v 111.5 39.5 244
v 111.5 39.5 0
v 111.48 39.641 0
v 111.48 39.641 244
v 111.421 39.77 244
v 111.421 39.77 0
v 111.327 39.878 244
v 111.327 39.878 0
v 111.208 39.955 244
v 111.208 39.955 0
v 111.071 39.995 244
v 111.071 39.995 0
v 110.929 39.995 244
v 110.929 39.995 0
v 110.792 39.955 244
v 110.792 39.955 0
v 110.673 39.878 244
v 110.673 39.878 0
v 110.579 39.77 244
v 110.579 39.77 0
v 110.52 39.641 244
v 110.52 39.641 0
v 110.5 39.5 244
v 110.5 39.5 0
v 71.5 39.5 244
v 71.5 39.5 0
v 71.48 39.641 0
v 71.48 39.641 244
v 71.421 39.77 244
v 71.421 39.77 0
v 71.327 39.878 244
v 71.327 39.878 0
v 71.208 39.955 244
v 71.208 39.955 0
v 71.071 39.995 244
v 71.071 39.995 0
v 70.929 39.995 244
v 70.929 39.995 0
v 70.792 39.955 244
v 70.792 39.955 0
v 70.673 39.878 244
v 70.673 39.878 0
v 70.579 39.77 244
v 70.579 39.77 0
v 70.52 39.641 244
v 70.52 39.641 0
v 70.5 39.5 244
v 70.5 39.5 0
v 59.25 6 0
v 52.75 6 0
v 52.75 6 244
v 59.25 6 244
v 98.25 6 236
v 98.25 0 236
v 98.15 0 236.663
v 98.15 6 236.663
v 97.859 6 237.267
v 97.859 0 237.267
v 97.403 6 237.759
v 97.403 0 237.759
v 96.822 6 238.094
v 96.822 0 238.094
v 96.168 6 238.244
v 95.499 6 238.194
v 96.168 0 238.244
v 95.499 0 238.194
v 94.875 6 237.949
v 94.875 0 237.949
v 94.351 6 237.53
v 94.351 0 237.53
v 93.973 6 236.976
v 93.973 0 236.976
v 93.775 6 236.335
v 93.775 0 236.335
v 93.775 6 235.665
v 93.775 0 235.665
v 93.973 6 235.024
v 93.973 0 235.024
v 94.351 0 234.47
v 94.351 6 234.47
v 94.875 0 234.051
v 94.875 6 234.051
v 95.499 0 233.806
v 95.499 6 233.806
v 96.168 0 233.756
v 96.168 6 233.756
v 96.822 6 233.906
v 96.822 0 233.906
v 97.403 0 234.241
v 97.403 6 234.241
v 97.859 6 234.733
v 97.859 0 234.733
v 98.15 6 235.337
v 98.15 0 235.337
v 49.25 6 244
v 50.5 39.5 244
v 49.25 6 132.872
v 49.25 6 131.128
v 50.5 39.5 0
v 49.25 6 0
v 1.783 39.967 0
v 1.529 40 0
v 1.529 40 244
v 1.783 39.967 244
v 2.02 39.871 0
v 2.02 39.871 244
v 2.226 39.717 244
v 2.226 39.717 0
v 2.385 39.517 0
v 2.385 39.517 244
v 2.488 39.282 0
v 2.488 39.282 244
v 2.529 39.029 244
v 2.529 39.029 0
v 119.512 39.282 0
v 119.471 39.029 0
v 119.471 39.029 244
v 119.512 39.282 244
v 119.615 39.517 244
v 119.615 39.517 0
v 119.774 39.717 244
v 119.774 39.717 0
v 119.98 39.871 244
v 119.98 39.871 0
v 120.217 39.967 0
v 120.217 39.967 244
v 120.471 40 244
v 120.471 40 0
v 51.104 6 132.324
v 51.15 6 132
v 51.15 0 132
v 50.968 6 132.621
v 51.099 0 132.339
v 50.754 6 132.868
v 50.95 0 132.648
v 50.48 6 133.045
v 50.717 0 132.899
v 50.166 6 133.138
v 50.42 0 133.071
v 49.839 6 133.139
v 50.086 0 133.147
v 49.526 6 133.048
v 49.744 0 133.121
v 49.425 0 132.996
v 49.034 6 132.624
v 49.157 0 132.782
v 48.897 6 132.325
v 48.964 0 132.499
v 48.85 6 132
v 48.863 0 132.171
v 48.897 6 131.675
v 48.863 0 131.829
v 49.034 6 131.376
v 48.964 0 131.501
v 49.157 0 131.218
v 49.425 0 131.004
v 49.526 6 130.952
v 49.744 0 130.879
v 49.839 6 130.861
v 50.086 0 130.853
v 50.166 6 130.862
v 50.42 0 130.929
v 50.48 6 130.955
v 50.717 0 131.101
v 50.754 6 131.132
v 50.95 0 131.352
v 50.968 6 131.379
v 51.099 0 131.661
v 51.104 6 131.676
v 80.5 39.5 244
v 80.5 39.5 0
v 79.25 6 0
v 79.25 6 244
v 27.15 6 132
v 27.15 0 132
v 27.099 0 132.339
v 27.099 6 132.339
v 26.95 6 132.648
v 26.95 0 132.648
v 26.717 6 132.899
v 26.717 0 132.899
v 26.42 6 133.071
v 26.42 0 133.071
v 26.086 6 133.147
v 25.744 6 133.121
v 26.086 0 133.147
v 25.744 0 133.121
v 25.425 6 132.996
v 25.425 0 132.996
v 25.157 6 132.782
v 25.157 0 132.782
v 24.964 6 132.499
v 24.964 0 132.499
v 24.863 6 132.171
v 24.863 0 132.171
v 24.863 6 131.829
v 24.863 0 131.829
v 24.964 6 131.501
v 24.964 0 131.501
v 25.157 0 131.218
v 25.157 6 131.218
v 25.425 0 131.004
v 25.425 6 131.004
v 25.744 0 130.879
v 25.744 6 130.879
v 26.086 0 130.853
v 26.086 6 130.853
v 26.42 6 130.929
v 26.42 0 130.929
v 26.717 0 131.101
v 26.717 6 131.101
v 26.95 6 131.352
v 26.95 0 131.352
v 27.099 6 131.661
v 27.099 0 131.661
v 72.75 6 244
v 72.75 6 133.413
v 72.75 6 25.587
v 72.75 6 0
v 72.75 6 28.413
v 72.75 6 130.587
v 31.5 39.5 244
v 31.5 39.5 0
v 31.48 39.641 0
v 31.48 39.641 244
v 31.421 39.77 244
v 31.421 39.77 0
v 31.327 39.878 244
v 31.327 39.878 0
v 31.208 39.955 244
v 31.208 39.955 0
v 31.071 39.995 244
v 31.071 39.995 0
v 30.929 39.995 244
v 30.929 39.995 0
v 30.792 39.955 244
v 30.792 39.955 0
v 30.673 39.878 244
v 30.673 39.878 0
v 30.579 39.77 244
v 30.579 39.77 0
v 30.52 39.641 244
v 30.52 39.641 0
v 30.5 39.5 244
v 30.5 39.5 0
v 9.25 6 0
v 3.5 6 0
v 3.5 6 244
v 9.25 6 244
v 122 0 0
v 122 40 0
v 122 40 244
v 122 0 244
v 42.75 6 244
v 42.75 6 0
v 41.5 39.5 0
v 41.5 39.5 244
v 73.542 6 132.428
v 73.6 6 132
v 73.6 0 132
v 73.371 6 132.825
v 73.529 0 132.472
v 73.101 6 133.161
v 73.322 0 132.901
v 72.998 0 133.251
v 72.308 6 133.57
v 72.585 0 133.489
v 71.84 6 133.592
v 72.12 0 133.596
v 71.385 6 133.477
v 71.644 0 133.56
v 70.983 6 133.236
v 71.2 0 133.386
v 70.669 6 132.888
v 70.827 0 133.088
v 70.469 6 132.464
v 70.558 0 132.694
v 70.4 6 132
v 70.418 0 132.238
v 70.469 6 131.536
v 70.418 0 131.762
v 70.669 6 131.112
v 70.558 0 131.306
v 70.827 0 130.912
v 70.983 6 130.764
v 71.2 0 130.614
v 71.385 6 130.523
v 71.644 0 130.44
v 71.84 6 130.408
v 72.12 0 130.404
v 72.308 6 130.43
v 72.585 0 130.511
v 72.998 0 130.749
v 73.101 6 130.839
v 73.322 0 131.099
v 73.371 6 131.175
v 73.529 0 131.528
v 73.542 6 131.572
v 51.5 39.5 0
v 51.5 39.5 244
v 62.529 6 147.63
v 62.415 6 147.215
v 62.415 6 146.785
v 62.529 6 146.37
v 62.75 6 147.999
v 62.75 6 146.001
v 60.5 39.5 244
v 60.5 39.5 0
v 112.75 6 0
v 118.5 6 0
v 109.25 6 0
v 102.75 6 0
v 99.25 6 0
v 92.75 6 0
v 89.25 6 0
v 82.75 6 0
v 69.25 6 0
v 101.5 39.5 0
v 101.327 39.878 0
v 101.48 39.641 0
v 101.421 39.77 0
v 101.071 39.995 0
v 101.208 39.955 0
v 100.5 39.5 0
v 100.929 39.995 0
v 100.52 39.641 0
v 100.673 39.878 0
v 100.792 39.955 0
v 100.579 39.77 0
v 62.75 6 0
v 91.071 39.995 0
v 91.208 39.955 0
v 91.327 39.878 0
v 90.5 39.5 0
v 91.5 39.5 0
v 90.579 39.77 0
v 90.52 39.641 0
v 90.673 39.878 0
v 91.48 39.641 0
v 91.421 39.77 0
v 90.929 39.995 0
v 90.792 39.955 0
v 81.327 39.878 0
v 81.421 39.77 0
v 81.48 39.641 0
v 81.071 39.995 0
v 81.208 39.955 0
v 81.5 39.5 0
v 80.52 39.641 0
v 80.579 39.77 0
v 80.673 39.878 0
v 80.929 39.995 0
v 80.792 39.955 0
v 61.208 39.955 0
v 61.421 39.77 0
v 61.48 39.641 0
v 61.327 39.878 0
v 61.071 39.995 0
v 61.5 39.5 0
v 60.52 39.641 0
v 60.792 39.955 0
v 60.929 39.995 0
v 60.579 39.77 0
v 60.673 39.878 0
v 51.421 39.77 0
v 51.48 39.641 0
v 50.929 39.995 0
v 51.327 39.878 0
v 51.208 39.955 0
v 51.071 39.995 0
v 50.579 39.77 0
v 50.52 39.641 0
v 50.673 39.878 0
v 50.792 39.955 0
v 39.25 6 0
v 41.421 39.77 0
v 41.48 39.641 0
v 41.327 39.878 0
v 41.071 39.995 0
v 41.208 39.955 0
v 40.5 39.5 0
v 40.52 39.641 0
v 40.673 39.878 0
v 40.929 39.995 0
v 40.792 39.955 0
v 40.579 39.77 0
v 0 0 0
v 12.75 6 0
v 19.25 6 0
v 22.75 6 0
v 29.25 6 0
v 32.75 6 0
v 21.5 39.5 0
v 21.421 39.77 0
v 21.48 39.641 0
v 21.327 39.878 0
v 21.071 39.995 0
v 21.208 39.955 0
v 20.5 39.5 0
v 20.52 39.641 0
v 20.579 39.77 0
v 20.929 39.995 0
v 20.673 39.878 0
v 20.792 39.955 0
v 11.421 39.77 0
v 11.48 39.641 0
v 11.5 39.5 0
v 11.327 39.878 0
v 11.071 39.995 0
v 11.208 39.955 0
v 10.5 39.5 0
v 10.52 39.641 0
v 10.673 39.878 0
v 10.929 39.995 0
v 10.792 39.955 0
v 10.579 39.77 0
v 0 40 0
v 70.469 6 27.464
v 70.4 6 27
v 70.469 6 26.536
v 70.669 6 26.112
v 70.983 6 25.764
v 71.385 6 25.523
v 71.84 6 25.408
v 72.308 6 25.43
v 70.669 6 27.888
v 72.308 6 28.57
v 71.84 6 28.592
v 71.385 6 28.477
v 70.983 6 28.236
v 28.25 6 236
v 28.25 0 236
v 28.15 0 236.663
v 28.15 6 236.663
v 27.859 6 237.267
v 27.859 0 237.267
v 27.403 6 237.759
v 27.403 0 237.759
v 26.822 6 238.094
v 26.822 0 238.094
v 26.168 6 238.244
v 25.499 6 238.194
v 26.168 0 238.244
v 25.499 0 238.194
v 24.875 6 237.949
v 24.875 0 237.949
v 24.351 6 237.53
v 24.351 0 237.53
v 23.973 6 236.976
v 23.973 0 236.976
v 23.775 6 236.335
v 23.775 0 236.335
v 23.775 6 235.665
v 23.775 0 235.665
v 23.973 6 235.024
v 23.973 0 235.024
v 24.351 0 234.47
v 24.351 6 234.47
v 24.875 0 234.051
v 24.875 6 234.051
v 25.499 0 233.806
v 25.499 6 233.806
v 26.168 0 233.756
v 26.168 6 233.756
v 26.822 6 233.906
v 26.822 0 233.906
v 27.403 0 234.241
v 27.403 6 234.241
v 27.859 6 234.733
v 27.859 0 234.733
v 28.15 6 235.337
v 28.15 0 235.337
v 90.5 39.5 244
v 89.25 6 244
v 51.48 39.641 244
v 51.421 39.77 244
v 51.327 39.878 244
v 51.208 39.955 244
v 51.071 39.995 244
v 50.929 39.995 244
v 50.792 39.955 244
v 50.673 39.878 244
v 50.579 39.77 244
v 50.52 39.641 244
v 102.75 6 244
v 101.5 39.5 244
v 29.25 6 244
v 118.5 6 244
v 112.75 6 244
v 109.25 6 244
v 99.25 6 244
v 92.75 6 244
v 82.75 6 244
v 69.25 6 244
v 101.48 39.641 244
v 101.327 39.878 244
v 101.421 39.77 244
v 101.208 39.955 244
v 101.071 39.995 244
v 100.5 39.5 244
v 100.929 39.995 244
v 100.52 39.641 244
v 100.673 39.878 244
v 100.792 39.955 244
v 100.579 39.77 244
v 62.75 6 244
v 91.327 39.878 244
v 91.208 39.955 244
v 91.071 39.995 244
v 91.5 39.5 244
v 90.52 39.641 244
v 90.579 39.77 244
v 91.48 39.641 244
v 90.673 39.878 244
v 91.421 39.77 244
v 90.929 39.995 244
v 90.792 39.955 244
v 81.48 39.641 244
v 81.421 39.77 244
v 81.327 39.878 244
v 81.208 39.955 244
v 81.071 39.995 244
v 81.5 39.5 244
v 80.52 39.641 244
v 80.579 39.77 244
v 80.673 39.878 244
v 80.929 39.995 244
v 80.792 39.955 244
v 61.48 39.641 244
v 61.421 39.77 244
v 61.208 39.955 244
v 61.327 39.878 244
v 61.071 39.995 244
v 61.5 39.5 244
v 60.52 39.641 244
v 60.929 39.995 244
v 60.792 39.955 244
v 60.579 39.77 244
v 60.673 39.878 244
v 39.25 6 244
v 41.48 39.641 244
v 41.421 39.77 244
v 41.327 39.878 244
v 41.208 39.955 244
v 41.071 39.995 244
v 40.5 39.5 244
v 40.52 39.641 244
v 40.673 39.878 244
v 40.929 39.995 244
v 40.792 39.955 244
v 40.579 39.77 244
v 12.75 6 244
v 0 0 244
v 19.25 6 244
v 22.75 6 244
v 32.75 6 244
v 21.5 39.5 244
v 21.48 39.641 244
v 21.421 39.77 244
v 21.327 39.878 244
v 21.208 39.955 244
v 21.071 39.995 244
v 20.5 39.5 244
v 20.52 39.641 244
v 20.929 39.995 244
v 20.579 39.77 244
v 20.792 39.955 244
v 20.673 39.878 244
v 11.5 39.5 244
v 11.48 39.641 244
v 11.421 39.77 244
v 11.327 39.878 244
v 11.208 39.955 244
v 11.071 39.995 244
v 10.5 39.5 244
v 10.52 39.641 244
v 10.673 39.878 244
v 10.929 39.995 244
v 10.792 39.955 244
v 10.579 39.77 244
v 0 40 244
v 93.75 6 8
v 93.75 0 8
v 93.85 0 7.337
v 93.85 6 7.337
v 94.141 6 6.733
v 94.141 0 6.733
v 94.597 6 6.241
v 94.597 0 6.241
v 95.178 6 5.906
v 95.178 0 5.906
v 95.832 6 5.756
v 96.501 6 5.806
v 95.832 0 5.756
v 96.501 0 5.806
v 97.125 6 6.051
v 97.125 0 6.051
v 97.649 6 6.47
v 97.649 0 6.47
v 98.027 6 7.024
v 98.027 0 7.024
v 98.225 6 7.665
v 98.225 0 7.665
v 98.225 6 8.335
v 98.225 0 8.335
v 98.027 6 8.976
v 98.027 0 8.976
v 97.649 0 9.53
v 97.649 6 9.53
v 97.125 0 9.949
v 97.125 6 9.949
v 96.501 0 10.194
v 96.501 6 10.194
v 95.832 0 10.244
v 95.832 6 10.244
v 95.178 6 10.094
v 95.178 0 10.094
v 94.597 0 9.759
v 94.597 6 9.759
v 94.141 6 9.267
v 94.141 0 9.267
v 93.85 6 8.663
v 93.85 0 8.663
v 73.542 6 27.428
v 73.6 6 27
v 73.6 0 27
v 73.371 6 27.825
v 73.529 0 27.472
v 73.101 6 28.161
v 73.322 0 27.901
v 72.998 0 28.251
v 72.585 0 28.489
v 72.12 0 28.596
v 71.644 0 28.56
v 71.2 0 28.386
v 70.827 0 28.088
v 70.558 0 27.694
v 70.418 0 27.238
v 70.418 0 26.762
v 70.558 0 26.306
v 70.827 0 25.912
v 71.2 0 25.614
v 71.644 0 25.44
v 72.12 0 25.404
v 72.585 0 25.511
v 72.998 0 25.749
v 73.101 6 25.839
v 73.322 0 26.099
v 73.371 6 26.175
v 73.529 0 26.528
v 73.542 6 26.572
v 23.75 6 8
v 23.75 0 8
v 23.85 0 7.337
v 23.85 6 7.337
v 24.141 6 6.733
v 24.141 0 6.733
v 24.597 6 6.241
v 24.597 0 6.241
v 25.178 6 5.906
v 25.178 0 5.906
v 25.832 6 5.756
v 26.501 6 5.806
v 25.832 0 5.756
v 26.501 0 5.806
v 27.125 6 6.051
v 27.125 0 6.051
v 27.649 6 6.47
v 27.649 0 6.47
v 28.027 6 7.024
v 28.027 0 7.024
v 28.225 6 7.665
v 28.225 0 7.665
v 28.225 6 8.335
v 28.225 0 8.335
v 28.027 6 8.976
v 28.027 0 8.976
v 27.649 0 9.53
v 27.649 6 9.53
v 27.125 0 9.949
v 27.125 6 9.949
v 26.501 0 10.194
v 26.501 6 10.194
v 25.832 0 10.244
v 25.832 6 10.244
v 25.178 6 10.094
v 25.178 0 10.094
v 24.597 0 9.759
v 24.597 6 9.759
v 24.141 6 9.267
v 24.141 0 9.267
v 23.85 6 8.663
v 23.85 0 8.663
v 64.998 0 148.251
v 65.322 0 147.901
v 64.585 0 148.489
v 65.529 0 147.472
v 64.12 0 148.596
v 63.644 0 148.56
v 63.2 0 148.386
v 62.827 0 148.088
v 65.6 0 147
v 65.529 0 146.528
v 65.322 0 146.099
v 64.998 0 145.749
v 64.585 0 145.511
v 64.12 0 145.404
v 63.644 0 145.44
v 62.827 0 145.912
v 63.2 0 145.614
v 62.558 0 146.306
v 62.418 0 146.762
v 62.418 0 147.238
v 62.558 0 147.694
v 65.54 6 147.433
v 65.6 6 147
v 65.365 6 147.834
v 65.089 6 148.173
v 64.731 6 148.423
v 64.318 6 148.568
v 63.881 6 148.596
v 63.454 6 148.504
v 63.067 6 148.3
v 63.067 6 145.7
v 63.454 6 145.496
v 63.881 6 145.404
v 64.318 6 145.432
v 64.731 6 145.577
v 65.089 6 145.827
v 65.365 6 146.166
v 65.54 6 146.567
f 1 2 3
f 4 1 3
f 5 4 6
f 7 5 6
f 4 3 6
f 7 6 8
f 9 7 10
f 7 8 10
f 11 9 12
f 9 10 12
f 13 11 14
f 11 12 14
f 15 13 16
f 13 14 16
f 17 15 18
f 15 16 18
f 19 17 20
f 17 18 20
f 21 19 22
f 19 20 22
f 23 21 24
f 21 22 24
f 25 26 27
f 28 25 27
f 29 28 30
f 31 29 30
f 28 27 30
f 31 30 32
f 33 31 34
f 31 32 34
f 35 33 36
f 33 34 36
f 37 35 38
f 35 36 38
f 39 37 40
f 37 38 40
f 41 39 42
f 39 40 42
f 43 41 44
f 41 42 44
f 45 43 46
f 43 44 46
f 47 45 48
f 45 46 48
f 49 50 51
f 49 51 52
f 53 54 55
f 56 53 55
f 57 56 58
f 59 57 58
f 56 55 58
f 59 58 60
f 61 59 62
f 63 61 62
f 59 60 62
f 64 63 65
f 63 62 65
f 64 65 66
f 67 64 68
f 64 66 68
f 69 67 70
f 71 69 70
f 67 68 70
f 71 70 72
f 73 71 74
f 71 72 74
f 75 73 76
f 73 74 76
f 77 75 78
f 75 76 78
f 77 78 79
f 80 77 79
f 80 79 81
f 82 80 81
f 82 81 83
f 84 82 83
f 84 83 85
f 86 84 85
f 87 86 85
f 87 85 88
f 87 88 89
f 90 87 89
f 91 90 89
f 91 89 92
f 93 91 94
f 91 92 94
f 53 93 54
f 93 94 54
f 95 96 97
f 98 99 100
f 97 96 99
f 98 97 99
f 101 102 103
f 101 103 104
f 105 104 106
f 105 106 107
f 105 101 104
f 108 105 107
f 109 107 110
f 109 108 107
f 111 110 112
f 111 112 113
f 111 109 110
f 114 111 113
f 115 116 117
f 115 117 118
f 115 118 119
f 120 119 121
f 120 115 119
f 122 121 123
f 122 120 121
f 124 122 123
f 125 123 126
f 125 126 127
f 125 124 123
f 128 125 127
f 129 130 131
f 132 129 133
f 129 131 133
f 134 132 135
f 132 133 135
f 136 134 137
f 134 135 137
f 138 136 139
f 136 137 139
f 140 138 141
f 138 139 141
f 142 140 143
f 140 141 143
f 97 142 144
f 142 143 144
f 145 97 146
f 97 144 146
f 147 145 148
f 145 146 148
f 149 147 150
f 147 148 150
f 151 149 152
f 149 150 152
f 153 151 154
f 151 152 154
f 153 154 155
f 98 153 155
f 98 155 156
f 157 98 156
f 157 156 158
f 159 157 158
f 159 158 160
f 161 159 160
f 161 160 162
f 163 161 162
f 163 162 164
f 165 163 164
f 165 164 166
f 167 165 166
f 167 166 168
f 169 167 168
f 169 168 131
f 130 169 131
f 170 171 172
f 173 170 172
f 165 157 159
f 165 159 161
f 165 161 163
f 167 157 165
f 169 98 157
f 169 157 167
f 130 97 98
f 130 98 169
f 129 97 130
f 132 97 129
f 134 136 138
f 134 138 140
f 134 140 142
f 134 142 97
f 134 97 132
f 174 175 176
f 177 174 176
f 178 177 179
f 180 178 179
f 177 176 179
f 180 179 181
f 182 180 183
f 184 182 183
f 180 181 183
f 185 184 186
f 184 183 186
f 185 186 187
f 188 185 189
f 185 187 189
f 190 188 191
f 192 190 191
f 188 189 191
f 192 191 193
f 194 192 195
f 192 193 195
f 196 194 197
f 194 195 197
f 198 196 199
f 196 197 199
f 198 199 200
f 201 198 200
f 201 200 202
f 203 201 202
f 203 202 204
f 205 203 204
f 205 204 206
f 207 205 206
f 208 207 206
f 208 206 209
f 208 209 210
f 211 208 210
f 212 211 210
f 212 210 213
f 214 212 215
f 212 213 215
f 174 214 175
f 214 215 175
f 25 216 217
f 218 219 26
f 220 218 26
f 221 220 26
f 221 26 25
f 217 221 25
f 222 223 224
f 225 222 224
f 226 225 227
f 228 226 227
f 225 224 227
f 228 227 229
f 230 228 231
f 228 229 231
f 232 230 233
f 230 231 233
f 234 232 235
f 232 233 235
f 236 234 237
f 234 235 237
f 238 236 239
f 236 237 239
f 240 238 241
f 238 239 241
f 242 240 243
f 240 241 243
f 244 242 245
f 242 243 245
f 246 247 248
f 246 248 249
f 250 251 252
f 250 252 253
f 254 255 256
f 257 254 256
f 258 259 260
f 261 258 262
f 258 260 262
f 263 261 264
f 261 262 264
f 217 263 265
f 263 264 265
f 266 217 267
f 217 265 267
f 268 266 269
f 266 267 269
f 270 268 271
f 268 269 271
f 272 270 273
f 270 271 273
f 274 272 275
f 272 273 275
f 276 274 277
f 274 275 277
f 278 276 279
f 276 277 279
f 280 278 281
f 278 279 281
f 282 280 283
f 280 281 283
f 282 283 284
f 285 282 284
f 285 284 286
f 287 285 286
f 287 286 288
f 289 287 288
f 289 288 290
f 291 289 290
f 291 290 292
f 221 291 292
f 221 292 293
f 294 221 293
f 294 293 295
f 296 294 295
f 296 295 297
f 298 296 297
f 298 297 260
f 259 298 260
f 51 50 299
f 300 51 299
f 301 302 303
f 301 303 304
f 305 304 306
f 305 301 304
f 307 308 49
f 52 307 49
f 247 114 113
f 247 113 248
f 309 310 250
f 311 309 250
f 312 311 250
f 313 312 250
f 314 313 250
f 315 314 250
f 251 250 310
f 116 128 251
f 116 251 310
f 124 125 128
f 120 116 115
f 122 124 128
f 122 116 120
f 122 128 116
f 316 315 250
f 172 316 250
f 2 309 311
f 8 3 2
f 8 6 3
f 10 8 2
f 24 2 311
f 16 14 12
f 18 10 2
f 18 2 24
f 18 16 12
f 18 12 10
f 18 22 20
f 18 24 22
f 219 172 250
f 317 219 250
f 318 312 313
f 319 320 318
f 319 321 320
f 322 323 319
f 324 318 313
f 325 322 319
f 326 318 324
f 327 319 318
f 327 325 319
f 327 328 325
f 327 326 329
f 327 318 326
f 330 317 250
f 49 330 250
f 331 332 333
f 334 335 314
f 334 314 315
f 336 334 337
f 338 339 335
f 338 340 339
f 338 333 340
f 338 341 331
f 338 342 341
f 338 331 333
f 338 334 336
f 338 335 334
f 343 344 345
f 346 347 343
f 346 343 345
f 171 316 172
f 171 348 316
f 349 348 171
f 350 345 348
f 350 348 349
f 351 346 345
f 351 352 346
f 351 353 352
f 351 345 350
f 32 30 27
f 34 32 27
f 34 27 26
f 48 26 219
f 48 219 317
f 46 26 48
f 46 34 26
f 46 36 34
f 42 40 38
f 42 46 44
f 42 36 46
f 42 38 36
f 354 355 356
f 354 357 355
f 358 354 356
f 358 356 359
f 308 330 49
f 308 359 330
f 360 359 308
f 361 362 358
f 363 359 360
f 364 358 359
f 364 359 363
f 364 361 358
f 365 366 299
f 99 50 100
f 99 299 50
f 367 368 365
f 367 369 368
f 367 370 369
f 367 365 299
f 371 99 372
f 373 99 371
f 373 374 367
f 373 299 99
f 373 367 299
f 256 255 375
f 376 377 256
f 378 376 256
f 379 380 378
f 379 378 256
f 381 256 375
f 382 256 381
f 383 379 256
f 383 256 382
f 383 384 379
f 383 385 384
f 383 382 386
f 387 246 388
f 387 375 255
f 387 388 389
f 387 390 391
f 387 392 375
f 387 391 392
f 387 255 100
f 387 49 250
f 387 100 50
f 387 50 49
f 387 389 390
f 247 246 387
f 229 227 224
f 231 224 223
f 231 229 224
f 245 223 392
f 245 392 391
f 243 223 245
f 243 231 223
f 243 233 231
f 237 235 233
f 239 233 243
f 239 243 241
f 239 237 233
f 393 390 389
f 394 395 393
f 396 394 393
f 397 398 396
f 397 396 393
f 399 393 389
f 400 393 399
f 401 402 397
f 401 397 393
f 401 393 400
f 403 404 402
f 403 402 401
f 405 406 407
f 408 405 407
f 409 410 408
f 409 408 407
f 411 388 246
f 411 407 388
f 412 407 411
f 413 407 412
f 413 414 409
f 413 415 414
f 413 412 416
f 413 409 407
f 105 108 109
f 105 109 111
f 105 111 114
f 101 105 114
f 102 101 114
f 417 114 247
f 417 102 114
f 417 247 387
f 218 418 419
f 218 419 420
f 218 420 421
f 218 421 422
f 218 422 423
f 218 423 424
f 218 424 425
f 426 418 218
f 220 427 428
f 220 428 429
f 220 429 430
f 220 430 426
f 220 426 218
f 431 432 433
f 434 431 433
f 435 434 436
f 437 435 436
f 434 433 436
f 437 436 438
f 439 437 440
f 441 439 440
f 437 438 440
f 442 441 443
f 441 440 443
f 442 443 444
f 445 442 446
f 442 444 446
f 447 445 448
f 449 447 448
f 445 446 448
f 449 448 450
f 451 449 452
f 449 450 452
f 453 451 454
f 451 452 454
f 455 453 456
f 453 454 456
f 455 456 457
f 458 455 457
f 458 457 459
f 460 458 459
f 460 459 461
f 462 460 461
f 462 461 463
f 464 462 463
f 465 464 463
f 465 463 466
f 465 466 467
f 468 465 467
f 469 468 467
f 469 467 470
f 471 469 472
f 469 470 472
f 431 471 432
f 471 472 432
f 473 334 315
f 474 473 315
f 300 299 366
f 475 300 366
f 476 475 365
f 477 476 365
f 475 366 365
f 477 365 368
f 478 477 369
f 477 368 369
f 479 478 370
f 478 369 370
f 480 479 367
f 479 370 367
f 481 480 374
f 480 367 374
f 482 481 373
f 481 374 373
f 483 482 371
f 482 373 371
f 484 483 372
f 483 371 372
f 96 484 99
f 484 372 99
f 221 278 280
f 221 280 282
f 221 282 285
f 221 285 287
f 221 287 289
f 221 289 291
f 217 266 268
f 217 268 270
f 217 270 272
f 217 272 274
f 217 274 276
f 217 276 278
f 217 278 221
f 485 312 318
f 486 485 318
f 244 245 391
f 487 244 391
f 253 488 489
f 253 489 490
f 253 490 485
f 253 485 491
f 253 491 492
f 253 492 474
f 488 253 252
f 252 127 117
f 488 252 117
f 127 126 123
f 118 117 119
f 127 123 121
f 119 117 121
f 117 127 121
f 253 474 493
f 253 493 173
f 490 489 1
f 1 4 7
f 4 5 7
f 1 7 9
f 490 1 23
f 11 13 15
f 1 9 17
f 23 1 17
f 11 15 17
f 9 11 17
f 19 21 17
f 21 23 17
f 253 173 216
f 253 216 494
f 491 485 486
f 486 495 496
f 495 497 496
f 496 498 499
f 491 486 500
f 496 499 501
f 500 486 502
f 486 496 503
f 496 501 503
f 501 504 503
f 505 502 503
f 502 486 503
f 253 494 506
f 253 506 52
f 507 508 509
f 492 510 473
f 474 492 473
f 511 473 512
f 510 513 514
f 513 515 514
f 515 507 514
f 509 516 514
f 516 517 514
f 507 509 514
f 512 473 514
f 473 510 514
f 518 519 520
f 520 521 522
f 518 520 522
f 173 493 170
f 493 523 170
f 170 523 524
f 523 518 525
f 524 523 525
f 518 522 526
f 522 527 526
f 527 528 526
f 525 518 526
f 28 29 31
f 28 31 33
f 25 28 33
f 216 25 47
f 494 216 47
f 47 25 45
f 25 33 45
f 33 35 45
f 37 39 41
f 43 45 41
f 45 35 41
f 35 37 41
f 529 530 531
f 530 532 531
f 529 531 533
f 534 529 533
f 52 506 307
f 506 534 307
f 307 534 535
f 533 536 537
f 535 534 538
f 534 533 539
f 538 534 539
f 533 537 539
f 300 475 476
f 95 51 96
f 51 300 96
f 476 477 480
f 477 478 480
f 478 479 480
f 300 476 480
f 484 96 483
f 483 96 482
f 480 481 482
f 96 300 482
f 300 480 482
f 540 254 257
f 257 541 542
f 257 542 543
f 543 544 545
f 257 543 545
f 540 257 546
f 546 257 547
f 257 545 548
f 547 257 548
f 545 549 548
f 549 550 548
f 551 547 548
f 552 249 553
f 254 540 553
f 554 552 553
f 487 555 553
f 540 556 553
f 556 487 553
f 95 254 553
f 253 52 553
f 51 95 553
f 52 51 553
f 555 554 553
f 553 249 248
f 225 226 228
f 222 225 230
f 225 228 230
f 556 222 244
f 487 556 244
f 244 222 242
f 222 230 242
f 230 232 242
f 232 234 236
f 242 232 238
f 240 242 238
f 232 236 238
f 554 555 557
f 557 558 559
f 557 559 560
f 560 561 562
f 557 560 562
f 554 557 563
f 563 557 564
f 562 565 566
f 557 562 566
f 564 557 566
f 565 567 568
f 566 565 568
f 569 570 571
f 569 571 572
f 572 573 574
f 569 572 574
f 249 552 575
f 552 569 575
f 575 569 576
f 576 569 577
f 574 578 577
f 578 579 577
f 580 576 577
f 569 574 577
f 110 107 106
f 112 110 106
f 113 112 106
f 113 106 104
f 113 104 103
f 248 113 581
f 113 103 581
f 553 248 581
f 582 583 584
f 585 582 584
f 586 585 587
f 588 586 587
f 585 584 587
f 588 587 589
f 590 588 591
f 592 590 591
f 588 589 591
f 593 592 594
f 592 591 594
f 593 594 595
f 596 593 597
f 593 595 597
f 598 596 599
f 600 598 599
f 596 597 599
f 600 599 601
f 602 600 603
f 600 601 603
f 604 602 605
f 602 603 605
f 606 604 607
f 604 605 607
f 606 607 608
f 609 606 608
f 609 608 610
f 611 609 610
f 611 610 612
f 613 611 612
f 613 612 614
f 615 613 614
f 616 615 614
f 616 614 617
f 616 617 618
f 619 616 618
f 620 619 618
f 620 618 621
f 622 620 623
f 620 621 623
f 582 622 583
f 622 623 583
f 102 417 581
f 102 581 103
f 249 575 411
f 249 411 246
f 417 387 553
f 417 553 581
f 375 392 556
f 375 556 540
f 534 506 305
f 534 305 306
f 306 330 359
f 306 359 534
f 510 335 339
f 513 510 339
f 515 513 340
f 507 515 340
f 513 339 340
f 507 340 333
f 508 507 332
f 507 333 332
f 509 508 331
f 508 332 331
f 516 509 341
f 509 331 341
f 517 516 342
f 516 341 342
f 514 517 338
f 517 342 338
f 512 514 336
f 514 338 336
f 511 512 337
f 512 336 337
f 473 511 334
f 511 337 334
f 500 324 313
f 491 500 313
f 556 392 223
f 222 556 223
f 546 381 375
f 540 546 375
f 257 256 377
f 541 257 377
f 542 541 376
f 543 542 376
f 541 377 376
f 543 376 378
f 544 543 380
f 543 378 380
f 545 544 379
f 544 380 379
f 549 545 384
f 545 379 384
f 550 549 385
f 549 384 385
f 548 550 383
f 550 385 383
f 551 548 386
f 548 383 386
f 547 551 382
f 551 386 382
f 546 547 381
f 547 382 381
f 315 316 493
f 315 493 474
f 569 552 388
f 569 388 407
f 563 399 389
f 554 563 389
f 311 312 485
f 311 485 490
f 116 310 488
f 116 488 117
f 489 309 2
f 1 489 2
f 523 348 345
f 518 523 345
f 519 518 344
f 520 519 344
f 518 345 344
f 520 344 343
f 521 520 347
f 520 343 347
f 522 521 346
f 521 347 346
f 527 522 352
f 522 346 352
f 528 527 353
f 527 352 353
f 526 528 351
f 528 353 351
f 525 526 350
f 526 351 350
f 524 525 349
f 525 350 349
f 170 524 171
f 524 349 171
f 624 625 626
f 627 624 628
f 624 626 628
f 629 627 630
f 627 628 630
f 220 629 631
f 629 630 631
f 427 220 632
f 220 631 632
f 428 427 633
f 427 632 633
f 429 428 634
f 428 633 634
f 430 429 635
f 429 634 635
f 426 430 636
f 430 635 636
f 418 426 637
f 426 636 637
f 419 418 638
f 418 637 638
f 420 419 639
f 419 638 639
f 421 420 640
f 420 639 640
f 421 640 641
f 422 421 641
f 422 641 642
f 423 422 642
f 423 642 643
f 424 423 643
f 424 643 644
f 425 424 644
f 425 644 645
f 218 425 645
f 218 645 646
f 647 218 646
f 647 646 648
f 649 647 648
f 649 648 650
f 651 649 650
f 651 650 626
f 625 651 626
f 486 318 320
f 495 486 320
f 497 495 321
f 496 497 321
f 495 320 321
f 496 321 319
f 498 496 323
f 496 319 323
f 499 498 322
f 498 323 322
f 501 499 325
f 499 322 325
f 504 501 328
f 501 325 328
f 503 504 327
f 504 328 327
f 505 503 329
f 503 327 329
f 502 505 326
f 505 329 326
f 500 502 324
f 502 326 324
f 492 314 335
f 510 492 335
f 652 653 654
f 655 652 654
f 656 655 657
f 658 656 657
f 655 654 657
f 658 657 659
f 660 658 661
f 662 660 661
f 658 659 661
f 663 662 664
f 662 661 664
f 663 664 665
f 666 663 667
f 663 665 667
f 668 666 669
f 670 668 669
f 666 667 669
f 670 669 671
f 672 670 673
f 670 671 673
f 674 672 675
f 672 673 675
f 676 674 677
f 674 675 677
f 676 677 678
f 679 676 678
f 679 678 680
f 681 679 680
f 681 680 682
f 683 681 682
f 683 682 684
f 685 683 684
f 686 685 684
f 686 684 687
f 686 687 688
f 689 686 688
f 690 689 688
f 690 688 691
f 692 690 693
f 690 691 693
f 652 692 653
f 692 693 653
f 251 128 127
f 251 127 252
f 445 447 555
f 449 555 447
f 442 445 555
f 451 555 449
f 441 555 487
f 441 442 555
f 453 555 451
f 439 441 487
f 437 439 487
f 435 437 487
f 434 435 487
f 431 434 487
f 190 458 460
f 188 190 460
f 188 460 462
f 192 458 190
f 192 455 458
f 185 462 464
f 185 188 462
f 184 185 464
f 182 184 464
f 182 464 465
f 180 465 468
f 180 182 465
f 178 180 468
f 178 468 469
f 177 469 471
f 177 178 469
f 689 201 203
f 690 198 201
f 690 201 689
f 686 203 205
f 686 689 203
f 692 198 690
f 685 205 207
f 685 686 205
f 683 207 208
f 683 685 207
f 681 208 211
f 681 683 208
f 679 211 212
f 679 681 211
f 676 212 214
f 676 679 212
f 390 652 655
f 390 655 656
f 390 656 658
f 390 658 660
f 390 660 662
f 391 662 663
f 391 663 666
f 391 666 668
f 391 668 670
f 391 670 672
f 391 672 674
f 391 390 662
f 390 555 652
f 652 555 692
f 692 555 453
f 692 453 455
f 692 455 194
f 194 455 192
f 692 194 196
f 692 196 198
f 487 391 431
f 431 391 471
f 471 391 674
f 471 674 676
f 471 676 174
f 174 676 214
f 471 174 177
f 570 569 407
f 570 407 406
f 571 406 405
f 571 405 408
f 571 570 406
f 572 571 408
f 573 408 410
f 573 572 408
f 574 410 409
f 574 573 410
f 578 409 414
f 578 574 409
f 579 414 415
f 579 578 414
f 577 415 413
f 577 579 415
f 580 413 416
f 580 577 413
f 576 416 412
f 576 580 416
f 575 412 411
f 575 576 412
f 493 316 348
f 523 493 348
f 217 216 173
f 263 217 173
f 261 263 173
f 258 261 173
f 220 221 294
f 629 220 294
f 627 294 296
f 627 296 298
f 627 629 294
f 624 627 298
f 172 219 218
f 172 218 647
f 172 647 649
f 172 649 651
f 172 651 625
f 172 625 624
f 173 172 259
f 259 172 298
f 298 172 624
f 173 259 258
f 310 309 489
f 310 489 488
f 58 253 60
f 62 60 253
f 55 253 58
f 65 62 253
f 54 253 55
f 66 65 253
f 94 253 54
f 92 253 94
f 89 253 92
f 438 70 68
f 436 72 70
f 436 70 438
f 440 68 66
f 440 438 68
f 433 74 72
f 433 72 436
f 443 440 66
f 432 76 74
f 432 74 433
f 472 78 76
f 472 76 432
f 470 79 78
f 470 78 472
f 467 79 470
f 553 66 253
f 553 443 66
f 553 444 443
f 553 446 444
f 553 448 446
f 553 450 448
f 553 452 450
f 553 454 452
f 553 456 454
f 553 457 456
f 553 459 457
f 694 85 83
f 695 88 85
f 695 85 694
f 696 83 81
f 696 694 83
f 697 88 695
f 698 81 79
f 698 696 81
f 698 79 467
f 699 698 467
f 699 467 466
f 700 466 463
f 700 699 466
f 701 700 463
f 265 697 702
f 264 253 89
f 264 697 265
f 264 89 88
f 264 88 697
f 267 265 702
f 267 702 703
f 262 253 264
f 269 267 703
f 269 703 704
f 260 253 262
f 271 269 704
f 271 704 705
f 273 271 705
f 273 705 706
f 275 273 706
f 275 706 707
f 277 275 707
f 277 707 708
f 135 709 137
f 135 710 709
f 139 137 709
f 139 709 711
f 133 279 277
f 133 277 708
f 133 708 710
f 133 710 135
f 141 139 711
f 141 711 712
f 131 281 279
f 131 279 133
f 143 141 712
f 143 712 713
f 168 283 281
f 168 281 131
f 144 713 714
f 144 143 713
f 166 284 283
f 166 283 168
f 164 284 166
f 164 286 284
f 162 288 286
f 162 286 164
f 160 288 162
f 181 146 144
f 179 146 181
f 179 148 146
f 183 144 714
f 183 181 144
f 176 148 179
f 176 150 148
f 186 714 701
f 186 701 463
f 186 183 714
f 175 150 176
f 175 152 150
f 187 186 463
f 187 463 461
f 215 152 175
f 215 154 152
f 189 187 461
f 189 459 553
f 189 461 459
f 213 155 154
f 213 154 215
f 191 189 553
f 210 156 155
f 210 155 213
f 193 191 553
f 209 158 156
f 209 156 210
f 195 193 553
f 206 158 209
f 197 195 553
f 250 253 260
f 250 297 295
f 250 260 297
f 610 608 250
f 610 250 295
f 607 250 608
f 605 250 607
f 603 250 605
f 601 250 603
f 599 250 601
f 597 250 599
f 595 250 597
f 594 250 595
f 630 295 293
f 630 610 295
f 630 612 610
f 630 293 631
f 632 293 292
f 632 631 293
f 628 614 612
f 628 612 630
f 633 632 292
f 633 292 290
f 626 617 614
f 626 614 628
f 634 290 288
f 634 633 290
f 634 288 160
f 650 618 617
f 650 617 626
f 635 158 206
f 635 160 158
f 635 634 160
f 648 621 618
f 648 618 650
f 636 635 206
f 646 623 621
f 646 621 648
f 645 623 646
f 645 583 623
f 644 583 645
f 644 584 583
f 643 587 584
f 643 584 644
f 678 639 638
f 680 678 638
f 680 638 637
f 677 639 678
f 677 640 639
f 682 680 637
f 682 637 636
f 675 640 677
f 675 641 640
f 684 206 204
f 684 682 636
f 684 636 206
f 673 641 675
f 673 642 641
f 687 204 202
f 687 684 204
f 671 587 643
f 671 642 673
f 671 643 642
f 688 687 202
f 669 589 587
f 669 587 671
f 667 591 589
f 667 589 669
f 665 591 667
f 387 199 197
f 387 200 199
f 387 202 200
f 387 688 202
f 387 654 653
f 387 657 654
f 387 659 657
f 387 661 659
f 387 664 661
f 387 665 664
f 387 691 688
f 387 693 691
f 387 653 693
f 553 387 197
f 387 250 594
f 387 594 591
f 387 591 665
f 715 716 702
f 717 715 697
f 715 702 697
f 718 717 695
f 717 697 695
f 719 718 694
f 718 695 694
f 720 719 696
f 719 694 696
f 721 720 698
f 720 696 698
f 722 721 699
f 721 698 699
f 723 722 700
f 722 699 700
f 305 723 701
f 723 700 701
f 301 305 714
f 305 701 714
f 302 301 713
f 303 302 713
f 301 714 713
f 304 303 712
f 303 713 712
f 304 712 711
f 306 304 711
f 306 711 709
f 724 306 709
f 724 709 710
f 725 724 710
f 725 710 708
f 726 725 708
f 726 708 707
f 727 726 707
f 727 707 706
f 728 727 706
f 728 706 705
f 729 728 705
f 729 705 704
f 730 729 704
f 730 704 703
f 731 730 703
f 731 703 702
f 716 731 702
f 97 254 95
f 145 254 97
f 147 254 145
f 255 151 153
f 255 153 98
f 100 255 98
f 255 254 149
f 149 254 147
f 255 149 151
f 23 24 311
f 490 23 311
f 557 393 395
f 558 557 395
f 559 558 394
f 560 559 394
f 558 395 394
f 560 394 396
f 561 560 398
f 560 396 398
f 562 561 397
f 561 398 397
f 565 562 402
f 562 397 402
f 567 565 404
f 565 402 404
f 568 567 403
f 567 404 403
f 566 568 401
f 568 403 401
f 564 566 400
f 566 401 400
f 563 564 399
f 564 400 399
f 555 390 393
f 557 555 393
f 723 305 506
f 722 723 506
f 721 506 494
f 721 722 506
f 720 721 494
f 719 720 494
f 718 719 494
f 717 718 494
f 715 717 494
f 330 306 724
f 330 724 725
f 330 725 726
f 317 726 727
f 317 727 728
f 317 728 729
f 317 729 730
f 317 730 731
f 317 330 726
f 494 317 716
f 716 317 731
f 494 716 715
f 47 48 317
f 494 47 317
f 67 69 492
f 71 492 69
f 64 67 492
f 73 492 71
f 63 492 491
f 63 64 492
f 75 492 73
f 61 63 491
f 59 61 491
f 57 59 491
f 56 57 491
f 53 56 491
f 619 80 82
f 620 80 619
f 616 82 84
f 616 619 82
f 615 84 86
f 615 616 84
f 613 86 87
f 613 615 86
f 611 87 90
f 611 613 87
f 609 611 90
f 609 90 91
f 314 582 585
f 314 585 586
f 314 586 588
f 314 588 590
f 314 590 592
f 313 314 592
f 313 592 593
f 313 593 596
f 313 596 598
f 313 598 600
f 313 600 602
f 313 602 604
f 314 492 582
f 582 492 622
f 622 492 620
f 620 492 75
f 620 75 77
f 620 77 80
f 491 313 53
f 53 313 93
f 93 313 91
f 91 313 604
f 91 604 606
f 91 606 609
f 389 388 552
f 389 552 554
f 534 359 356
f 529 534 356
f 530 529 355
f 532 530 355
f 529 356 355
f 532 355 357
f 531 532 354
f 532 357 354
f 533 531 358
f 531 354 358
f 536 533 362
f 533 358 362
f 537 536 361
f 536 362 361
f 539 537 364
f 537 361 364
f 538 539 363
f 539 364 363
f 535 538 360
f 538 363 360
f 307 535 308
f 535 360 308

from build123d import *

# Parameters (mm, degrees)
EXTRUDE_1_DEPTH       = 244
EXTRUDE_3_DEPTH       = 244
PATTERN_CURVE_1_COUNT = 11
PATTERN_CURVE_1_PITCH = 10
SKETCH_3_R            = 2.25
CUT_EXTRUDE_1_DEPTH   = 6
SKETCH_4_R            = 1.6
SKETCH_4_R_2          = 1.15
CUT_EXTRUDE_2_DEPTH   = 6


with BuildPart() as part:
    # Эскиз1 → Вытянуть1 (new body)
    with BuildSketch(Plane.XY):
        with BuildLine():
            Line((0, 40), (1.528979332, 40))
            ThreePointArc((1.528979332, 40), (2.225614441, 39.717425624), (2.528547087, 39.029399052))
            Line((2.528547087, 39.029399052), (3.5, 6))
            Line((3.5, 6), (118.5, 6))
            Line((118.5, 6), (119.471452913, 39.029399052))
            ThreePointArc((119.471452913, 39.029399052), (119.774385559, 39.717425624), (120.471020668, 40))
            Line((120.471020668, 40), (122, 40))
            Line((122, 40), (122, 0))
            Line((122, 0), (0, 0))
            Line((0, 0), (0, 40))
        make_face()
    extrude(amount=EXTRUDE_1_DEPTH)

    # Эскиз2 → Вытянуть3 (add)
    with BuildSketch(Plane.XY.offset(244)):
        with BuildLine():
            Line((10.5, 39.5), (9.25, 6))
            Line((9.25, 6), (12.75, 6))
            Line((12.75, 6), (11.5, 39.5))
            ThreePointArc((11.5, 39.5), (11, 40), (10.5, 39.5))
        make_face()
    extrude_3 = extrude(amount=-EXTRUDE_3_DEPTH)

    # Кривая1: Вытянуть3 ×11
    with Locations(*[(i * PATTERN_CURVE_1_PITCH, 0, 0) for i in range(1, PATTERN_CURVE_1_COUNT)]):
        add(extrude_3)

    # Эскиз3 → Вырез-Вытянуть1 (cut)
    with BuildSketch(Plane.XZ):
        with Locations((26, 236)):
            Circle(SKETCH_3_R)
        with Locations((96, 236)):
            Circle(SKETCH_3_R)
        with Locations((96, 8)):
            Circle(SKETCH_3_R)
        with Locations((26, 8)):
            Circle(SKETCH_3_R)
    extrude(amount=-CUT_EXTRUDE_1_DEPTH, mode=Mode.SUBTRACT)

    # Эскиз4 → Вырез-Вытянуть2 (cut)
    with BuildSketch(Plane(origin=(133.240090243, 0, 310.149074448), x_dir=(-1, 0, 0), z_dir=(0, -1, 0))):
        with Locations((8.990090243, 225.549074448)):
            Circle(SKETCH_4_R)
        with Locations((83.240090243, 178.149074448)):
            Circle(SKETCH_4_R_2)
        with Locations((69.240090243, 163.149074448)):
            Circle(SKETCH_4_R)
        with Locations((61.240090243, 283.149074448)):
            Circle(SKETCH_4_R)
        with Locations((61.240090243, 178.149074448)):
            Circle(SKETCH_4_R)
        with Locations((107.240090243, 178.149074448)):
            Circle(SKETCH_4_R_2)
    extrude(amount=-CUT_EXTRUDE_2_DEPTH, mode=Mode.SUBTRACT)


solid = part.part
